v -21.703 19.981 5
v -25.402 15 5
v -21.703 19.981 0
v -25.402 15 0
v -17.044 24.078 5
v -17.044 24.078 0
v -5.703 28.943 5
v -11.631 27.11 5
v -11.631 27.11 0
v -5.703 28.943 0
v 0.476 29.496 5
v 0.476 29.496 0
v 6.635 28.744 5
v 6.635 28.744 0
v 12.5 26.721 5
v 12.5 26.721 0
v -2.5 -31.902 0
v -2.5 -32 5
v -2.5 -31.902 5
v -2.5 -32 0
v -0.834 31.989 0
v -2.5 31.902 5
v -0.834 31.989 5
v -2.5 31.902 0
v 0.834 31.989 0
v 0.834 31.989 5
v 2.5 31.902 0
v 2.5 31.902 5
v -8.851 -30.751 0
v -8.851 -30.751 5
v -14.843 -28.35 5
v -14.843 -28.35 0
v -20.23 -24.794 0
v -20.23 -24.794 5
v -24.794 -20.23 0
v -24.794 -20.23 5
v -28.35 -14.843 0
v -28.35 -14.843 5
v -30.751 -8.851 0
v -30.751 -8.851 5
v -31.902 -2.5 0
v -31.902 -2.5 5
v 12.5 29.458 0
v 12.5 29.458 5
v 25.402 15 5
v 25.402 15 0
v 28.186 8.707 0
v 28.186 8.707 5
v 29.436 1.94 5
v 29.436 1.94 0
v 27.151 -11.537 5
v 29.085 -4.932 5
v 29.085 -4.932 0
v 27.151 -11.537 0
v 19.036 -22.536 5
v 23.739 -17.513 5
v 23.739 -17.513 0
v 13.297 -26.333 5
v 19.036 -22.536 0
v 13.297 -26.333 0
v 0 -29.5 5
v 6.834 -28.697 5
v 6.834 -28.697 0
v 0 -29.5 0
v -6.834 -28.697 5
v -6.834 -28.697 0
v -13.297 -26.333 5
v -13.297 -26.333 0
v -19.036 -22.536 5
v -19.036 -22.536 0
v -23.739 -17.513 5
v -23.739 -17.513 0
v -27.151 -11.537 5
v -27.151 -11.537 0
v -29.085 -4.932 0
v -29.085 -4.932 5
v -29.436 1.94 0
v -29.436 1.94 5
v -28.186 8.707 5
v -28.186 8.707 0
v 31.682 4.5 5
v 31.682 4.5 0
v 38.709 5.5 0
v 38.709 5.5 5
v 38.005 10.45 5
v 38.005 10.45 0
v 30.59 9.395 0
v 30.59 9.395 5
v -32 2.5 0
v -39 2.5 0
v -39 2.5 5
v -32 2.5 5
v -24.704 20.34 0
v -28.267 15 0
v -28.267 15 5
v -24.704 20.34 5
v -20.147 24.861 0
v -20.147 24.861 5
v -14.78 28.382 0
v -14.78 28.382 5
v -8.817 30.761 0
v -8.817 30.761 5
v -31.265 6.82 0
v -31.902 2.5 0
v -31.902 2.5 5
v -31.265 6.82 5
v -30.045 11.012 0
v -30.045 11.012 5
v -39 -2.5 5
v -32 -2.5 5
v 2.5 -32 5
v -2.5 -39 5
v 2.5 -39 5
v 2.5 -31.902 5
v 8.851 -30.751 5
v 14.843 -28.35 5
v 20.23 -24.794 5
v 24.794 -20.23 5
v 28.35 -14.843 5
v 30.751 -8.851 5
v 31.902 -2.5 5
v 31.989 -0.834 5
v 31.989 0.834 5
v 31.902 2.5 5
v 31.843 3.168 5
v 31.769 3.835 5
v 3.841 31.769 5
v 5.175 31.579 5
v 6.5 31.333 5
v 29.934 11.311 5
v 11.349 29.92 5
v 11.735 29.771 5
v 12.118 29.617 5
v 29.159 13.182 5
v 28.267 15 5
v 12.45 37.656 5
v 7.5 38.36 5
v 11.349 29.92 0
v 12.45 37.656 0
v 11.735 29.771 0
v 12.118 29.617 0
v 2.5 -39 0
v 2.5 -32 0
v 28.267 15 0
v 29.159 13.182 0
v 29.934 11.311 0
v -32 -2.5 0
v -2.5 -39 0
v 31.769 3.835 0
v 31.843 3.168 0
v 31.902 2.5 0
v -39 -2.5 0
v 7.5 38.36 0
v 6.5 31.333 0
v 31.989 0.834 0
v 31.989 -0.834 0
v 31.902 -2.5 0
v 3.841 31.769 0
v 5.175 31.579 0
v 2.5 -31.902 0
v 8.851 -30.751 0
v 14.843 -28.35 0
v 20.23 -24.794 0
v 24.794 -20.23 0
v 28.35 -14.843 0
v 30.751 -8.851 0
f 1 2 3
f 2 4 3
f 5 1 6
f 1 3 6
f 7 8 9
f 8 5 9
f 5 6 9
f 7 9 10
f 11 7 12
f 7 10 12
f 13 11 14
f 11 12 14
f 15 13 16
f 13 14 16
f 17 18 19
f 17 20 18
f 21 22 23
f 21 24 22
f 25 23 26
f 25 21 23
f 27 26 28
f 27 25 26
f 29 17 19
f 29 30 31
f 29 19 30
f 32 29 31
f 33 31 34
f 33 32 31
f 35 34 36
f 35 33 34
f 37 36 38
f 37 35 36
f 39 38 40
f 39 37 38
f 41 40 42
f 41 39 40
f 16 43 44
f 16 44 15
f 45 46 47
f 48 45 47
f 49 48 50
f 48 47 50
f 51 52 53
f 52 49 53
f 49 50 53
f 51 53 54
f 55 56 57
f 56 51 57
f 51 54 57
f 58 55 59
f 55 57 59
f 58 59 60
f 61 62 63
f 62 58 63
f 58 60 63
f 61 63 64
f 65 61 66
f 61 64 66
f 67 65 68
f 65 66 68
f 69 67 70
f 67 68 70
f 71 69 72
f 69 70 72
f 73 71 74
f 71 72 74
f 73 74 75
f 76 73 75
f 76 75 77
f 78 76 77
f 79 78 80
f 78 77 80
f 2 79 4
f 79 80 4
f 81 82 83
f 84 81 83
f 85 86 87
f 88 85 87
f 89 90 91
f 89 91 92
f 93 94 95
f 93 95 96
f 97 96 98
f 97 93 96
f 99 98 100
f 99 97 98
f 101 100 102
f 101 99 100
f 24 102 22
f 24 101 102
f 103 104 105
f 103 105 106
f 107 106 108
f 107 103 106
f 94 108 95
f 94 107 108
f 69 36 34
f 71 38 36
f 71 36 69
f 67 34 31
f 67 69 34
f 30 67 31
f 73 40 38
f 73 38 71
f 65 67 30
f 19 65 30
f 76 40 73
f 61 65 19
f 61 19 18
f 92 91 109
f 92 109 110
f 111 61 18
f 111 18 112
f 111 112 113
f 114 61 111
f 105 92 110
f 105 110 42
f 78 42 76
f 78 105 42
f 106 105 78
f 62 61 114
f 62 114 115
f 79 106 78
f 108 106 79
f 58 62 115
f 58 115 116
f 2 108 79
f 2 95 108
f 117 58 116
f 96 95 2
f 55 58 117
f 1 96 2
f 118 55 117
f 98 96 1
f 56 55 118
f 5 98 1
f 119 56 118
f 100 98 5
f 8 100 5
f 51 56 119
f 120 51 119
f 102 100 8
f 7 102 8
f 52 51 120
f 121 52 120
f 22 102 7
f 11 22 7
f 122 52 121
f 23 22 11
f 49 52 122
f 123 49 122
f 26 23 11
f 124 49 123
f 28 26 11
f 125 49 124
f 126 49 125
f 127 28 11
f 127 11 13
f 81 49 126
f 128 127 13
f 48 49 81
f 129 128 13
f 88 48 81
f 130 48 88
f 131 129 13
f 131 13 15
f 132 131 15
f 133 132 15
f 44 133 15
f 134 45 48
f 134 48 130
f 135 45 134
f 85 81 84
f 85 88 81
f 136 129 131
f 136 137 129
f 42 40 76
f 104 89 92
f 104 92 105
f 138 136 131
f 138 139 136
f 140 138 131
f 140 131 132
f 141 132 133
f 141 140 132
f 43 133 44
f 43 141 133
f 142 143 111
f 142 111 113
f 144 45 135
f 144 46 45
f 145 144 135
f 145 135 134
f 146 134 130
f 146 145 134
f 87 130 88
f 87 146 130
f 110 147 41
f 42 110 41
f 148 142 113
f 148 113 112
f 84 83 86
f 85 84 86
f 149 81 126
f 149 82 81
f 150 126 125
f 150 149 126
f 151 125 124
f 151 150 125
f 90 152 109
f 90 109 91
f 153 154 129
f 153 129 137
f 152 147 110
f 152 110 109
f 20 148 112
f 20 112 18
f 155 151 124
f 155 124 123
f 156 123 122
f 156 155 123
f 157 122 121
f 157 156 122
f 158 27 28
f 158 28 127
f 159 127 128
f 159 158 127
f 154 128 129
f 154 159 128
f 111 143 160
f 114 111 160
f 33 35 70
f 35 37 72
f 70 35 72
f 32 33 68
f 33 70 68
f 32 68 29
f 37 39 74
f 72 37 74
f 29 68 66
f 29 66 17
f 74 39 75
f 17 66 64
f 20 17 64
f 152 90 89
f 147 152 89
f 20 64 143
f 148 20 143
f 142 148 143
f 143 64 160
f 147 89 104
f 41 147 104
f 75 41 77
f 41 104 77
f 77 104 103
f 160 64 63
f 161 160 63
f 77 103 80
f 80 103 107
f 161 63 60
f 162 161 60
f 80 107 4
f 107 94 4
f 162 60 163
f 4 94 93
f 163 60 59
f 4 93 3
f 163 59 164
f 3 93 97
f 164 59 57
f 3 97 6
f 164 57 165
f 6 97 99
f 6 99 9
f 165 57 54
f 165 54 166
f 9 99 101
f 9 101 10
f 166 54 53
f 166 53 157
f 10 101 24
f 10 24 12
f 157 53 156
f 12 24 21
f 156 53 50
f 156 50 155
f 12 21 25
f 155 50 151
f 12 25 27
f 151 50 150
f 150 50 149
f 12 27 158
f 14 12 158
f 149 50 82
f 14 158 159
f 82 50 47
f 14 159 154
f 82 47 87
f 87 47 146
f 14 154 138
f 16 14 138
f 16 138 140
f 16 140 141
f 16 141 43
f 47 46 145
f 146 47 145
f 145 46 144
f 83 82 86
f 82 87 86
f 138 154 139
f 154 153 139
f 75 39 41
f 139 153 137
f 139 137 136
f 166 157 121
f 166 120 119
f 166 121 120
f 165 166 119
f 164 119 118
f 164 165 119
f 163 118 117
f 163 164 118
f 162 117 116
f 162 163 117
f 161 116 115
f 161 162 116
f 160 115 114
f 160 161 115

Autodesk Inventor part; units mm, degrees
ref_plane "YZ Plane" through (0, 0, 0) normal (1, 0, 0) x (0, 1, 0)
ref_plane "XZ Plane" through (0, 0, 0) normal (0, 1, 0) x (-1, 0, 0)
ref_plane "XY Plane" through (0, 0, 0) normal (0, 0, 1) x (1, 0, 0)
sketch "Sketch1" plane through (0, 0, 0) normal (0, 0, 1) x (1, 0, 0)
  arc A0 (-25.4018, 15) -> (25.4018, 15) centre (0, 0) ccw
  line L0 (25.4018, 15) -> (28.2666, 15)
  line L1 (-39, 2.5) -> (-32, 2.5)
  line L2 (-32, -2.5) -> (-39, -2.5)
  line L3 (-39, -2.5) -> (-39, 2.5)
  line L4 (-32, 2.5) -> (-31.9022, 2.5)
  line L5 (-32, -2.5) -> (-31.9022, -2.5)
  line L6 (2.5, -32) -> (2.5, -39)
  line L7 (2.5, -39) -> (-2.5, -39)
  line L8 (-2.5, -39) -> (-2.5, -32)
  line L9 (-2.5, -32) -> (-2.5, -31.9022)
  line L10 (2.5, -32) -> (2.5, -31.9022)
  arc A1 (-28.2666, 15) -> (-31.9022, 2.5) centre (0, 0) ccw
  arc A2 (-31.9022, -2.5) -> (-2.5, -31.9022) centre (0, 0) ccw
  arc A3 (2.5, -31.9022) -> (31.9022, -2.5) centre (0, 0) ccw
  arc A4 (12.5, 26.7208) -> (25.4018, 15) centre (0, 0) ccw
  line L11 (12.5, 29.4576) -> (12.5, 26.7208)
  arc A5 (-2.5, 31.9022) -> (-31.9022, 2.5) centre (0, 0) ccw
  arc A6 (-31.9022, -2.5) -> (-2.5, -31.9022) centre (0, 0) ccw
  arc A7 (2.5, -31.9022) -> (31.9022, -2.5) centre (0, 0) ccw
  line L12 (6.5, 31.3329) -> (7.5001, 38.3601)
  line L13 (6.5, 31.3329) -> (13.598, 31.3329) construction
  line L14 (7.5001, 38.3601) -> (12.4502, 37.6556)
  line L15 (12.4502, 37.6556) -> (11.3493, 29.9198)
  arc A8 (12.5, 29.4576) -> (11.3493, 29.9198) centre (0, 0) ccw
  arc A9 (12.5, 29.4576) -> (11.3493, 29.9198) centre (0, 0) ccw
  arc A10 (6.5, 31.3329) -> (2.5, 31.9022) centre (0, 0) ccw
  arc A11 (6.5, 31.3329) -> (-31.9022, 2.5) centre (0, 0) ccw
  arc A12 (-31.9022, -2.5) -> (-2.5, -31.9022) centre (0, 0) ccw
  arc A13 (2.5, -31.9022) -> (31.9022, -2.5) centre (0, 0) ccw
  line L16 (31.682, 4.5) -> (32.601, 4.5) construction
  line L17 (31.682, 4.5) -> (39.0737, 4.5) construction
  line L18 (-2.5, 31.9022) -> (4.598, 31.9022) construction
  line L19 (31.682, 4.5) -> (38.7092, 5.5001)
  line L20 (31.682, 4.5) -> (38.78, 4.5) construction
  line L21 (38.7092, 5.5001) -> (38.0047, 10.4502)
  line L22 (38.0047, 10.4502) -> (30.5898, 9.3949)
  arc A14 (30.5898, 9.3949) -> (28.2666, 15) centre (0, 0) ccw
  arc A15 (31.9022, 2.5) -> (31.682, 4.5) centre (0, 0) ccw
  arc A16 (30.5898, 9.3949) -> (28.2666, 15) centre (0, 0) ccw
  arc A17 (31.9022, 2.5) -> (31.682, 4.5) centre (0, 0) ccw
  arc A18 (30.5898, 9.3949) -> (28.2666, 15) centre (0, 0) ccw
  arc A19 (31.9022, 2.5) -> (31.682, 4.5) centre (0, 0) ccw
  arc A20 (30.5898, 9.3949) -> (28.2666, 15) centre (0, 0) ccw
  arc A21 (12.5, 29.4576) -> (11.3493, 29.9198) centre (0, 0) ccw
  arc A22 (2.5, -31.9022) -> (31.682, 4.5) centre (0, 0) ccw
  arc A23 (6.5, 31.3329) -> (-31.9022, 2.5) centre (0, 0) ccw
  arc A24 (-31.9022, -2.5) -> (-2.5, -31.9022) centre (0, 0) ccw
  point P0 (11.5, 29.8622)
  point P1 (2.5, 31.9022)
  point P2 (31.9022, -2.5)
  dimension "d78" = 7.098
  dimension "d79" = 81.9
  dimension "d80" = 5
  dimension "d81" = 90
  dimension "d82" = 90
  dimension "d94" = 7.098
  dimension "d95" = 8.1
  dimension "d96" = 5
  dimension "d97" = 90
  dimension "d98" = 90
extrude "Extrusion7" add sketch "Sketch1" along normal blind 5
properties part number "Clip_TestFitV1"
